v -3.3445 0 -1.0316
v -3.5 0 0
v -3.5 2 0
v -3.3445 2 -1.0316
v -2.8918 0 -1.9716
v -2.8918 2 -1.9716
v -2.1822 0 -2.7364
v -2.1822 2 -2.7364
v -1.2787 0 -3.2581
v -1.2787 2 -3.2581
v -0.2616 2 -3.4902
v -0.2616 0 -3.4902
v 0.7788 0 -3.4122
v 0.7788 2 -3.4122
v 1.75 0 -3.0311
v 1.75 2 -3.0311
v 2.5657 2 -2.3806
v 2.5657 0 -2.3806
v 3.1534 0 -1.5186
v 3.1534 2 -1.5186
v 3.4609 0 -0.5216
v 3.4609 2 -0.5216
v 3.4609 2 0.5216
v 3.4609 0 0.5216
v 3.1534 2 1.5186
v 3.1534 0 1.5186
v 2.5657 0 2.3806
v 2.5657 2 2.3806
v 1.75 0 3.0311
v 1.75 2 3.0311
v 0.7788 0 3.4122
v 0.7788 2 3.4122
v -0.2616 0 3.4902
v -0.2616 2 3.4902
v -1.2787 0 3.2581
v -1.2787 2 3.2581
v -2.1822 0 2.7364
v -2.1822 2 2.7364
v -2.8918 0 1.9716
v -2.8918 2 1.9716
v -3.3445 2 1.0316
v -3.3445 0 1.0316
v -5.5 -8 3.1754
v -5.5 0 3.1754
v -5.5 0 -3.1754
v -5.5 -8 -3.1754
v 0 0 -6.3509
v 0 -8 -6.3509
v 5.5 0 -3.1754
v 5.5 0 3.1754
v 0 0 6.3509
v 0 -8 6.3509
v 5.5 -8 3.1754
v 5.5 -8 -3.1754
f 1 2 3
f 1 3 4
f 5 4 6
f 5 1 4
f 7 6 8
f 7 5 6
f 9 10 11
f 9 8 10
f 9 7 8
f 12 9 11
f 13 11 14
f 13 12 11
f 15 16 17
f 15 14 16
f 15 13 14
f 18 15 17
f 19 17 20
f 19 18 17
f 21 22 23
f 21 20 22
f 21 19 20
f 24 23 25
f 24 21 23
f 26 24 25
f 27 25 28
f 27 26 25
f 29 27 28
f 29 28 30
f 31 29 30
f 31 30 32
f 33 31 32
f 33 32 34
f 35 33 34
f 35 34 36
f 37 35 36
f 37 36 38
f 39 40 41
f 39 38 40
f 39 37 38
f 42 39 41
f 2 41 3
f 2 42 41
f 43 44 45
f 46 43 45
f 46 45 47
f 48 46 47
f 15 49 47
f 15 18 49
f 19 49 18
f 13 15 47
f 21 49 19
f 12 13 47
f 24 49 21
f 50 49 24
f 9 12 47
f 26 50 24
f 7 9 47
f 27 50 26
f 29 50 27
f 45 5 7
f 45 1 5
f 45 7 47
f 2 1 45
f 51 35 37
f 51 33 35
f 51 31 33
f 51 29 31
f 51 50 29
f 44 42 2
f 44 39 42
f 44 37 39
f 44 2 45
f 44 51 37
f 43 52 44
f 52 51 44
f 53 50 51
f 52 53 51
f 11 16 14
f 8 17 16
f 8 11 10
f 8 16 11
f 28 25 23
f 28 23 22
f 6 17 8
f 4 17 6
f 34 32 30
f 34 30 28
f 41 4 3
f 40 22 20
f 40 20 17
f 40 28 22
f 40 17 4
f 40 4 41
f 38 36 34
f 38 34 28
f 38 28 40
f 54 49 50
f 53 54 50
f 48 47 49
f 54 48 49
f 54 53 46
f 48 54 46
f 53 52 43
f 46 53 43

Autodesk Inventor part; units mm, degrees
ref_plane "YZ Plane" through (0, 0, 0) normal (1, 0, 0) x (0, 1, 0)
ref_plane "XZ Plane" through (0, 0, 0) normal (0, 1, 0) x (-1, 0, 0)
ref_plane "XY Plane" through (0, 0, 0) normal (0, 0, 1) x (1, 0, 0)
sketch "Sketch1" plane through (0, 0, 0) normal (0, 1, 0) x (-1, 0, 0)
  line L0 (5.5, -3.1754) -> (0, -6.3509)
  line L1 (0, -6.3509) -> (-5.5, -3.1754)
  line L2 (-5.5, -3.1754) -> (-5.5, 3.1754)
  line L3 (-5.5, 3.1754) -> (0, 6.3509)
  line L4 (0, 6.3509) -> (5.5, 3.1754)
  line L5 (5.5, 3.1754) -> (5.5, -3.1754)
  circle A0 centre (0, 0) radius 3.5
  dimension "d0" = 7
  dimension "d1" = 11
extrude "Extrusion1" add sketch "Sketch1" against normal blind 8 contours L0 L1 L2 L3 L4 L5 | A0
extrude "Extrusion2" add sketch "Sketch1" along normal blind 2 contours A0
properties part number "EccentricNut 5mmID 11mmHex" material "Aluminum 6061"
